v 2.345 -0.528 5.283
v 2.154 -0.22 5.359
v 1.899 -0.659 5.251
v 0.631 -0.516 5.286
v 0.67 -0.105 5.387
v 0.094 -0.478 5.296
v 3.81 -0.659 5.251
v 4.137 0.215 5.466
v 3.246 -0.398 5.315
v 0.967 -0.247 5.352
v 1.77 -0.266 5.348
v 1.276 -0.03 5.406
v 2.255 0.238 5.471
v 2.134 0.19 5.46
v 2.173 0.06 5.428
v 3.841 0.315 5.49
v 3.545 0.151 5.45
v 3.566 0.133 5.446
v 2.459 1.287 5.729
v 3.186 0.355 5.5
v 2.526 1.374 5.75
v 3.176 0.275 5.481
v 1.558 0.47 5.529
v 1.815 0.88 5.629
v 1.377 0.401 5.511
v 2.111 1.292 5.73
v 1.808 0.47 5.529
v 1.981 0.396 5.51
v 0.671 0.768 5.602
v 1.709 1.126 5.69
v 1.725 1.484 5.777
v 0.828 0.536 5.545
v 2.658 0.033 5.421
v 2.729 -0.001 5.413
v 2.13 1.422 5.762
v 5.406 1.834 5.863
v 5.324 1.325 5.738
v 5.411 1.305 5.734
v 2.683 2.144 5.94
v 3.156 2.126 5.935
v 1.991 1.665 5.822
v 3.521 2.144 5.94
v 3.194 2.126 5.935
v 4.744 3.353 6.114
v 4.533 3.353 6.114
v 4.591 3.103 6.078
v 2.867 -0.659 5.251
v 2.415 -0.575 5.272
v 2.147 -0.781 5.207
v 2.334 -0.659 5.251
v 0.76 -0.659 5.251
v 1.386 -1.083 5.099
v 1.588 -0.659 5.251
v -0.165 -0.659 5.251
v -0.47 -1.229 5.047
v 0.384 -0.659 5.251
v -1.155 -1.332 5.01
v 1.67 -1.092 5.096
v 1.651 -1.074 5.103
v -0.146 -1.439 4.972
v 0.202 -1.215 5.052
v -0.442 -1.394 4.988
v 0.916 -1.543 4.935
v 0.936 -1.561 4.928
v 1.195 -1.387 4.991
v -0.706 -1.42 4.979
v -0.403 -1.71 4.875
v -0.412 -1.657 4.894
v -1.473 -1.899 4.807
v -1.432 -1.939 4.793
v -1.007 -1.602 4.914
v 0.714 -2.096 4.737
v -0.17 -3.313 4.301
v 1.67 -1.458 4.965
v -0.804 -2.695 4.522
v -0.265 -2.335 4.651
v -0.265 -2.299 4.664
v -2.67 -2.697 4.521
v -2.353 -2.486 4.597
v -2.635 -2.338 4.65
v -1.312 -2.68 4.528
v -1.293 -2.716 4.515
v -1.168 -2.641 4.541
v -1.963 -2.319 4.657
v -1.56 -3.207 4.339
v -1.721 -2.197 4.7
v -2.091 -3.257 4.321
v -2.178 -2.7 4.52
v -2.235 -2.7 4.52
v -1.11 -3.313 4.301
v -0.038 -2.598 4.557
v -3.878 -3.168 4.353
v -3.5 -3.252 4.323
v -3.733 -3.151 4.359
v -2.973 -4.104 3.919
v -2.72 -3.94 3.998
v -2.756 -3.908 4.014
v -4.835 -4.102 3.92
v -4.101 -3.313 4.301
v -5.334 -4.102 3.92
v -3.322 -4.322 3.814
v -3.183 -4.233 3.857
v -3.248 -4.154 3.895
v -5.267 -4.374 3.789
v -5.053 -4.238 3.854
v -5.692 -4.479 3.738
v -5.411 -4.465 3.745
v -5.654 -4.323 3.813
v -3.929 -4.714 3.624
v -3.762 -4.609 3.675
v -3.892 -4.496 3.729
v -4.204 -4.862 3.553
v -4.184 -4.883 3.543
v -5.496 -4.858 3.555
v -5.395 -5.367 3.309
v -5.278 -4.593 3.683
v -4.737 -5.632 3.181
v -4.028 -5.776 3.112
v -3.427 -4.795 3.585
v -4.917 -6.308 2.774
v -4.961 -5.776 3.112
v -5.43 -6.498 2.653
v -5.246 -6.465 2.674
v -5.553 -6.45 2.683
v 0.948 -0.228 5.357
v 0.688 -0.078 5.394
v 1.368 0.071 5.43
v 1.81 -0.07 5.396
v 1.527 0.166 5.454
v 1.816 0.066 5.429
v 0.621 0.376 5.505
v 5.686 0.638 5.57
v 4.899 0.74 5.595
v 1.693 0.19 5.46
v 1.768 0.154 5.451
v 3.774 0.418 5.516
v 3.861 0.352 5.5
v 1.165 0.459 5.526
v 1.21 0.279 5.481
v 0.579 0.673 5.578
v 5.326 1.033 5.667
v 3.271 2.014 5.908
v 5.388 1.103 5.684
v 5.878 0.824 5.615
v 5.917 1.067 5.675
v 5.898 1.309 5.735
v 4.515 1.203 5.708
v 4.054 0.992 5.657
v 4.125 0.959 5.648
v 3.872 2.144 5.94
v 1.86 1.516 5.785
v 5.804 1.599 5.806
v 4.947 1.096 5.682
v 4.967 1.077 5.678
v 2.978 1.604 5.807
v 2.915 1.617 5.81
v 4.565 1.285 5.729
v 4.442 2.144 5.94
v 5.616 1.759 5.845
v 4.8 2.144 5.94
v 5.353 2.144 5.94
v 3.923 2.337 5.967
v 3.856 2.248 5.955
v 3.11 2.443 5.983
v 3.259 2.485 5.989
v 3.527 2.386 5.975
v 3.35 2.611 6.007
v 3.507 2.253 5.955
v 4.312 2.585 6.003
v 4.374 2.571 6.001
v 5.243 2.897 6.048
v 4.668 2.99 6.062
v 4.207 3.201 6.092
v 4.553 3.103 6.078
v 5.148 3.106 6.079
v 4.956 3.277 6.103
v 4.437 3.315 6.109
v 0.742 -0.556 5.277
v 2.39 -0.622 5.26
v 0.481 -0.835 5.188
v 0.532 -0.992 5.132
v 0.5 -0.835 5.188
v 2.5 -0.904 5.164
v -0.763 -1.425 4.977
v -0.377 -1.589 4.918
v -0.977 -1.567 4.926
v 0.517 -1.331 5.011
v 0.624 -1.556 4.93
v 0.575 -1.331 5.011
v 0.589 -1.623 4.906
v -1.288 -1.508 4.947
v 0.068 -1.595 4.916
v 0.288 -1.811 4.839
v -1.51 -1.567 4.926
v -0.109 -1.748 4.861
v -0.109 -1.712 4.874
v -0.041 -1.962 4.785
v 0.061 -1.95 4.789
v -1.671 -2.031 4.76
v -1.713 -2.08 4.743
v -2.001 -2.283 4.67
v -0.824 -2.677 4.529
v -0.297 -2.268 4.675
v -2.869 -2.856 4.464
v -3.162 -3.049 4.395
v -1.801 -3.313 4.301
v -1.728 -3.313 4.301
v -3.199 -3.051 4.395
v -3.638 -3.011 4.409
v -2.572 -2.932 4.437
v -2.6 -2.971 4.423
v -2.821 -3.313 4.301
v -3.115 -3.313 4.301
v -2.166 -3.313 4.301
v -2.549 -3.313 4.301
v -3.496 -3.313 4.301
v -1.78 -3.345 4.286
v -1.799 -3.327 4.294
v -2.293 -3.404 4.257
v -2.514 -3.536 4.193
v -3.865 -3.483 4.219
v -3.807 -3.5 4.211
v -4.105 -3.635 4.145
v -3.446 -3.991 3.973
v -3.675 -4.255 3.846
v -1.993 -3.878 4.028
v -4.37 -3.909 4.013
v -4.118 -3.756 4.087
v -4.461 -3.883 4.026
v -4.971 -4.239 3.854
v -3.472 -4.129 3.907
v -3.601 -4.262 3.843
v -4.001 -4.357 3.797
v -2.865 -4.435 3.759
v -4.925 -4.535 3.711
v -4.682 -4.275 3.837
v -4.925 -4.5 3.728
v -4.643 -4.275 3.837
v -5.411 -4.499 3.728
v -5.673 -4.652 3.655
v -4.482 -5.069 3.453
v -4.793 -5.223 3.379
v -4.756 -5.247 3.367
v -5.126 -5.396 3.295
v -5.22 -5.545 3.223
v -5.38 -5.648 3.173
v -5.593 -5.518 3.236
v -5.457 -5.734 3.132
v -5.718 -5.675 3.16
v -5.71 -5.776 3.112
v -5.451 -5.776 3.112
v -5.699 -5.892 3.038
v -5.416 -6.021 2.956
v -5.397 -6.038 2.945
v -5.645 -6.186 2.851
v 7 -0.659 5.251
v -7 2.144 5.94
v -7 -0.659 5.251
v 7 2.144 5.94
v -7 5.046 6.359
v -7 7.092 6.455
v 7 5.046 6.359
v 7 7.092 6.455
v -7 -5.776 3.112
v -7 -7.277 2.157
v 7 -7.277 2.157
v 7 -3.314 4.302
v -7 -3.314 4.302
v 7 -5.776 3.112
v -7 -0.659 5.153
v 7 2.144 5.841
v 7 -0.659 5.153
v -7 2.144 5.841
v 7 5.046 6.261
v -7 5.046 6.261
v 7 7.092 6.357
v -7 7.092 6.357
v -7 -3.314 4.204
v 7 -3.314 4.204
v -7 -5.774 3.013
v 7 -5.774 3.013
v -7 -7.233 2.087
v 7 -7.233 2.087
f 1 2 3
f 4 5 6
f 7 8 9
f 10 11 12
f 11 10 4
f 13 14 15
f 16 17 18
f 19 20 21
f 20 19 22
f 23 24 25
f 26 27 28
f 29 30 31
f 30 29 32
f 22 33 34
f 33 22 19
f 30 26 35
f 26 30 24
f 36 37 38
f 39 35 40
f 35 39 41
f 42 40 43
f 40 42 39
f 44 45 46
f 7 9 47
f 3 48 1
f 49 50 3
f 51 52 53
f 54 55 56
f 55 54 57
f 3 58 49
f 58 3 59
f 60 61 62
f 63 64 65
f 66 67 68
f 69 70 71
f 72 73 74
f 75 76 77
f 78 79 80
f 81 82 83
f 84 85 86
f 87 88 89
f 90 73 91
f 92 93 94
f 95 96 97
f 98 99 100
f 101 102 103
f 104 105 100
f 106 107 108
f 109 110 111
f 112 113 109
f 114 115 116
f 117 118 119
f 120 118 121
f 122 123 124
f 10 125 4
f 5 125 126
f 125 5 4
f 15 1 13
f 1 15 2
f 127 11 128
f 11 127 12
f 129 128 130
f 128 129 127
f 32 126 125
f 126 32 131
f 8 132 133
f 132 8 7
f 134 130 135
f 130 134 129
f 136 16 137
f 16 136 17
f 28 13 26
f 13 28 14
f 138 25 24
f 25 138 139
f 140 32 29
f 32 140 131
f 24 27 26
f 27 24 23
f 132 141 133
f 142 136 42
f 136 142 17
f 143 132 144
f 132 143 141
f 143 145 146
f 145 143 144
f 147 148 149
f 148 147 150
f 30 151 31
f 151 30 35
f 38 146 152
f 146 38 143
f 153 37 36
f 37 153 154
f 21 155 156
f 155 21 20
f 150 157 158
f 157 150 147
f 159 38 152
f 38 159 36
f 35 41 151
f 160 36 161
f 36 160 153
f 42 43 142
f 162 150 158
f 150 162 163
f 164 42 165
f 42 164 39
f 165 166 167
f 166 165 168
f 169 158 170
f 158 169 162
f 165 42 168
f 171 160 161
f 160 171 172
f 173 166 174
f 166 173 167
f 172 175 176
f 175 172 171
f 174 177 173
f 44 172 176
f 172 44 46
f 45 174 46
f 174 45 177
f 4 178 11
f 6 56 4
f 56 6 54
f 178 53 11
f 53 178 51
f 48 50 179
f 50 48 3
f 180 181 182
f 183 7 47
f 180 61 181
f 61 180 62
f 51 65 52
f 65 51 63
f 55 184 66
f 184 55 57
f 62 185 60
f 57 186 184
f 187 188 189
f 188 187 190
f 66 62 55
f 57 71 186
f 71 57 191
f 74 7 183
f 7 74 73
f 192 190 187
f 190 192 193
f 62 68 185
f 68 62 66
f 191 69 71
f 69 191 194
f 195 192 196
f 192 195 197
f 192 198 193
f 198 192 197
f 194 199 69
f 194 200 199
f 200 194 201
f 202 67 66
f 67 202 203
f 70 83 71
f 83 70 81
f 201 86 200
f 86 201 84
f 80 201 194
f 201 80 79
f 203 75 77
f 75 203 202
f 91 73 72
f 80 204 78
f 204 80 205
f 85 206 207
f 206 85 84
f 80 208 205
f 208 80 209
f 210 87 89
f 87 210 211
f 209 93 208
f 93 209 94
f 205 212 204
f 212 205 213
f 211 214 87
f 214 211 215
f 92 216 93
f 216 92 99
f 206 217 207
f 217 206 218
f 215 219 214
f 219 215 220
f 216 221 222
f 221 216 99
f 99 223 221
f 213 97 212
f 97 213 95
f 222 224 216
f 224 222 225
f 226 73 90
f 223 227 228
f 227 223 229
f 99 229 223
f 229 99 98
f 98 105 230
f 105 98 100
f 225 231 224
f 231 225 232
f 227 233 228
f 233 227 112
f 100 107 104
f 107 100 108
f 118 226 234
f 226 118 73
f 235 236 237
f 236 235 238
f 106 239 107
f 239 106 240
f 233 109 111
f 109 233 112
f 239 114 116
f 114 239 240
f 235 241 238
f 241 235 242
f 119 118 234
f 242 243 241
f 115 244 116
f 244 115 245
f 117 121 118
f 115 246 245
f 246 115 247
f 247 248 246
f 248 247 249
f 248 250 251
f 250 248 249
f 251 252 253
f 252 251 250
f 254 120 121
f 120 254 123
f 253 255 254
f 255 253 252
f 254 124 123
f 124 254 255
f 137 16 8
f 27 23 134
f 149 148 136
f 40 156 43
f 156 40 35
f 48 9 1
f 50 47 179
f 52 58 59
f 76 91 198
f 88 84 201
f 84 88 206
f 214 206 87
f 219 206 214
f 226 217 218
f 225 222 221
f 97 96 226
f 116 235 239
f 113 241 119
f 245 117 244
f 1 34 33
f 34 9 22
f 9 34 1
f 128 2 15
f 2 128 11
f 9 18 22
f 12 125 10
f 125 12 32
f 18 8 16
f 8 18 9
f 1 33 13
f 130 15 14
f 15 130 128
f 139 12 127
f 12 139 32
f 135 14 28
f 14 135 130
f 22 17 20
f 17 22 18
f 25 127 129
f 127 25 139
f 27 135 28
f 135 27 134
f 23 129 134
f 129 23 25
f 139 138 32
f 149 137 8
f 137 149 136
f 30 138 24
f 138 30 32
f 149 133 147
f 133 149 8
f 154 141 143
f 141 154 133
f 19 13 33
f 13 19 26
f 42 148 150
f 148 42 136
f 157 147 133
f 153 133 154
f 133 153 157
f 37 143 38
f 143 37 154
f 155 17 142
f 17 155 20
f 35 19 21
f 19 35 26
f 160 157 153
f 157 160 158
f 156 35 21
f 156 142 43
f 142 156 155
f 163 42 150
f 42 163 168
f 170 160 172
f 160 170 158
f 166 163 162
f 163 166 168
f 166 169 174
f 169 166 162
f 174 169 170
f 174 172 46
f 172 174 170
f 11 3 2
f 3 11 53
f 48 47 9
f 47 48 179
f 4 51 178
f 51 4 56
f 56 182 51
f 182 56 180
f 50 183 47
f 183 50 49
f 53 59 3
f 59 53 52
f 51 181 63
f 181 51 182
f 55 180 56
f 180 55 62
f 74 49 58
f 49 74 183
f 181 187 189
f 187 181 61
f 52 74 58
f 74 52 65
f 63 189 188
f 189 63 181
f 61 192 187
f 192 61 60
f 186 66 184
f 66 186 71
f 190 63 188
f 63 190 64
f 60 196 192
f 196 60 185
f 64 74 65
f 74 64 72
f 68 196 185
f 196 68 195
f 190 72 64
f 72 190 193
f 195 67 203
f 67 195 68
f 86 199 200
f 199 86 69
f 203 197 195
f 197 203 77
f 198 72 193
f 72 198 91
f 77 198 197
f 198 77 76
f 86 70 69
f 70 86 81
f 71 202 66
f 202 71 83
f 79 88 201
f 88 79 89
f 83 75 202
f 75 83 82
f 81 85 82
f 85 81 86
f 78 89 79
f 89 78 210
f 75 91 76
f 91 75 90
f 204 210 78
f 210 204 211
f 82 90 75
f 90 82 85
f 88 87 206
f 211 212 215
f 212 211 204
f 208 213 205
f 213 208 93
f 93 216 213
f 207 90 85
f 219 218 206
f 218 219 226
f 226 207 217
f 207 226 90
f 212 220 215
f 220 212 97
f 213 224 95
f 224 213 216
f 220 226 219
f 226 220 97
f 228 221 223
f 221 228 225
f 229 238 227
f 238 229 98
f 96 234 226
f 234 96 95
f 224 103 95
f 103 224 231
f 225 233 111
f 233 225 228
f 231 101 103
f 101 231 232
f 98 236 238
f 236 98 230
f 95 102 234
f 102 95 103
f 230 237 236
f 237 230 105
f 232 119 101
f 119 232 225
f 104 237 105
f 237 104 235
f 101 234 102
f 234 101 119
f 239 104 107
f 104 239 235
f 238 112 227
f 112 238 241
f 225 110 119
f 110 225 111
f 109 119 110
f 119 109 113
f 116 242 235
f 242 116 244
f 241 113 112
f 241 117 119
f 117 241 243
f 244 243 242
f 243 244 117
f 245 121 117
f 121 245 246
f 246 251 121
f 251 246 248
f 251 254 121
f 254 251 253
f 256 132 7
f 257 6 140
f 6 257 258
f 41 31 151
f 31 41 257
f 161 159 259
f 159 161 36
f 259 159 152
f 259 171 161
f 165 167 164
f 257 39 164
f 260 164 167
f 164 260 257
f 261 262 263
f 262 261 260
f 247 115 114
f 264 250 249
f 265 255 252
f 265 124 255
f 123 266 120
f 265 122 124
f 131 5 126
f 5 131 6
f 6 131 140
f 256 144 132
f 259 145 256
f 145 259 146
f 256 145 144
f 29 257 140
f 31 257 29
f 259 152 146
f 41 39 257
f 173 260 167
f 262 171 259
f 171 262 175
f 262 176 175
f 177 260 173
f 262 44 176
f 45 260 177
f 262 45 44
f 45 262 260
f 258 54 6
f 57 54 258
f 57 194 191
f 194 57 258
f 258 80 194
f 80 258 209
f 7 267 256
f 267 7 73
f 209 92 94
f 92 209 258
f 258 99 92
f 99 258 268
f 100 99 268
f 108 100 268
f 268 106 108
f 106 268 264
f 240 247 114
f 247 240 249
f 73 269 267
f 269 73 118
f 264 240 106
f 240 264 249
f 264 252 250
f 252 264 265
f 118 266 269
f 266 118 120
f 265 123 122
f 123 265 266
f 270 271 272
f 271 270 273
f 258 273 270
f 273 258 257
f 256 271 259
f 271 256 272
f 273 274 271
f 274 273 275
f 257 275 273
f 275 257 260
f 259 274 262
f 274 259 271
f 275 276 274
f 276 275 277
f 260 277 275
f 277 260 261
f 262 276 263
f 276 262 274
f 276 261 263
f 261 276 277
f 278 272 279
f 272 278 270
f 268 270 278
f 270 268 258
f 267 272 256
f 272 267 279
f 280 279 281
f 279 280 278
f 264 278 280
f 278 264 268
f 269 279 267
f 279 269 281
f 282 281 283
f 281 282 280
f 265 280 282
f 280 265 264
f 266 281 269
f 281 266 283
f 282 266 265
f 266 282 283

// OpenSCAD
use <../lib.scad>
use <s/6296256ec01s01.scad>
function ldraw_lib__6372023ec01() = [
// 0 Sticker  1.9 x  1.8 with "nuova 500" Emblem on Bright Light Blue (Formed)
// 0 Name: 6372023ec01.dat
// 0 Author: Magnus Forsberg [MagFors]
// 0 !LDRAW_ORG Part UPDATE 2024-05
// 0 !LICENSE Licensed under CC BY 4.0 : see CAreadme.txt
// 
// 0 BFC CERTIFY CCW
  [0,"BFC","CERTIFY"],
  [0,"BFC","CCW"],
// 
// 0 !KEYWORDS 500, Bricklink 77942stk01, Brickowl 1064764, Cinquecento, FIAT
// 0 !KEYWORDS Nuova, Rebrickable 83460, set 77942
// 
// 0 !HISTORY 2024-06-30 [OrionP] Official Update 2024-05
// 
// 
// 1 212 0 0 0 1 0 0 0 1 0 0 0 1 s\6296256ec01s01.dat
  [1,212,0,0,0,1,0,0,0,1,0,0,0,1, ldraw_lib__s__6296256ec01s01()],
// 0 // backside
// 4 16 -17.5 -12.8827 -1.648 -17.5 -14.6036 5.36 17.5 -14.6036 5.36 17.5 -12.8827 -1.648
  [4,16,-17.5,-12.8827,-1.648,-17.5,-14.6036,5.36,17.5,-14.6036,5.36,17.5,-12.8827,-1.648],
// 4 16 -17.5 -12.8827 -1.648 -17.5 -13.1279 -1.648 -17.5 -14.8489 5.36 -17.5 -14.6036 5.36
  [4,16,-17.5,-12.8827,-1.648,-17.5,-13.1279,-1.648,-17.5,-14.8489,5.36,-17.5,-14.6036,5.36],
// 4 16 17.5 -13.1279 -1.648 17.5 -12.8827 -1.648 17.5 -14.6036 5.36 17.5 -14.8489 5.36
  [4,16,17.5,-13.1279,-1.648,17.5,-12.8827,-1.648,17.5,-14.6036,5.36,17.5,-14.8489,5.36],
// 4 16 17.5 -14.6036 5.36 -17.5 -14.6036 5.36 -17.5 -15.6524 12.616 17.5 -15.6524 12.616
  [4,16,17.5,-14.6036,5.36,-17.5,-14.6036,5.36,-17.5,-15.6524,12.616,17.5,-15.6524,12.616],
// 4 16 -17.5 -14.6036 5.36 -17.5 -14.8489 5.36 -17.5 -15.8969 12.616 -17.5 -15.6524 12.616
  [4,16,-17.5,-14.6036,5.36,-17.5,-14.8489,5.36,-17.5,-15.8969,12.616,-17.5,-15.6524,12.616],
// 4 16 17.5 -14.8489 5.36 17.5 -14.6036 5.36 17.5 -15.6524 12.616 17.5 -15.8969 12.616
  [4,16,17.5,-14.8489,5.36,17.5,-14.6036,5.36,17.5,-15.6524,12.616,17.5,-15.8969,12.616],
// 4 16 -17.5 -15.6524 12.616 -17.5 -15.8932 17.7298 17.5 -15.8932 17.7298 17.5 -15.6524 12.616
  [4,16,-17.5,-15.6524,12.616,-17.5,-15.8932,17.7298,17.5,-15.8932,17.7298,17.5,-15.6524,12.616],
// 4 16 -17.5 -15.6524 12.616 -17.5 -15.8969 12.616 -17.5 -16.1379 17.7301 -17.5 -15.8932 17.7298
  [4,16,-17.5,-15.6524,12.616,-17.5,-15.8969,12.616,-17.5,-16.1379,17.7301,-17.5,-15.8932,17.7298],
// 4 16 17.5 -15.8969 12.616 17.5 -15.6524 12.616 17.5 -15.8932 17.7298 17.5 -16.1379 17.7301
  [4,16,17.5,-15.8969,12.616,17.5,-15.6524,12.616,17.5,-15.8932,17.7298,17.5,-16.1379,17.7301],
// 4 16 -17.5 -16.1379 17.7301 17.5 -16.1379 17.7301 17.5 -15.8932 17.7298 -17.5 -15.8932 17.7298
  [4,16,-17.5,-16.1379,17.7301,17.5,-16.1379,17.7301,17.5,-15.8932,17.7298,-17.5,-15.8932,17.7298],
// 4 16 17.5 -12.8827 -1.648 17.5 -10.5099 -8.284 -17.5 -10.5099 -8.284 -17.5 -12.8827 -1.648
  [4,16,17.5,-12.8827,-1.648,17.5,-10.5099,-8.284,-17.5,-10.5099,-8.284,-17.5,-12.8827,-1.648],
// 4 16 -17.5 -12.8827 -1.648 -17.5 -10.5099 -8.284 -17.5 -10.7549 -8.284 -17.5 -13.1279 -1.648
  [4,16,-17.5,-12.8827,-1.648,-17.5,-10.5099,-8.284,-17.5,-10.7549,-8.284,-17.5,-13.1279,-1.648],
// 4 16 17.5 -13.1279 -1.648 17.5 -10.7549 -8.284 17.5 -10.5099 -8.284 17.5 -12.8827 -1.648
  [4,16,17.5,-13.1279,-1.648,17.5,-10.7549,-8.284,17.5,-10.5099,-8.284,17.5,-12.8827,-1.648],
// 4 16 -17.5 -10.5099 -8.284 17.5 -10.5099 -8.284 17.5 -7.5316 -14.436 -17.5 -7.5316 -14.436
  [4,16,-17.5,-10.5099,-8.284,17.5,-10.5099,-8.284,17.5,-7.5316,-14.436,-17.5,-7.5316,-14.436],
// 4 16 -17.5 -10.7549 -8.284 -17.5 -10.5099 -8.284 -17.5 -7.5316 -14.436 -17.5 -7.7789 -14.44
  [4,16,-17.5,-10.7549,-8.284,-17.5,-10.5099,-8.284,-17.5,-7.5316,-14.436,-17.5,-7.7789,-14.44],
// 4 16 17.5 -10.5099 -8.284 17.5 -10.7549 -8.284 17.5 -7.7789 -14.44 17.5 -7.5316 -14.436
  [4,16,17.5,-10.5099,-8.284,17.5,-10.7549,-8.284,17.5,-7.7789,-14.44,17.5,-7.5316,-14.436],
// 4 16 -17.5 -7.5316 -14.436 17.5 -7.5316 -14.436 17.5 -5.2174 -18.0819 -17.5 -5.2174 -18.0819
  [4,16,-17.5,-7.5316,-14.436,17.5,-7.5316,-14.436,17.5,-5.2174,-18.0819,-17.5,-5.2174,-18.0819],
// 4 16 -17.5 -7.7789 -14.44 -17.5 -7.5316 -14.436 -17.5 -5.2174 -18.0819 -17.5 -5.3931 -18.1936
  [4,16,-17.5,-7.7789,-14.44,-17.5,-7.5316,-14.436,-17.5,-5.2174,-18.0819,-17.5,-5.3931,-18.1936],
// 4 16 17.5 -7.5316 -14.436 17.5 -7.7789 -14.44 17.5 -5.3931 -18.1936 17.5 -5.2174 -18.0819
  [4,16,17.5,-7.5316,-14.436,17.5,-7.7789,-14.44,17.5,-5.3931,-18.1936,17.5,-5.2174,-18.0819],
// 4 16 -17.5 -5.3931 -18.1936 -17.5 -5.2174 -18.0819 17.5 -5.2174 -18.0819 17.5 -5.3931 -18.1936
  [4,16,-17.5,-5.3931,-18.1936,-17.5,-5.2174,-18.0819,17.5,-5.2174,-18.0819,17.5,-5.3931,-18.1936],
// 5 24 17.5 -15.8969 12.616 -17.5 -15.8969 12.616 17.5 -16.1379 17.7301 17.5 -14.8489 5.36
  [5,24,17.5,-15.8969,12.616,-17.5,-15.8969,12.616,17.5,-16.1379,17.7301,17.5,-14.8489,5.36],
// 5 24 17.5 -14.8489 5.36 -17.5 -14.8489 5.36 17.5 -15.8969 12.616 17.5 -13.1279 -1.648
  [5,24,17.5,-14.8489,5.36,-17.5,-14.8489,5.36,17.5,-15.8969,12.616,17.5,-13.1279,-1.648],
// 5 24 17.5 -13.1279 -1.648 -17.5 -13.1279 -1.648 17.5 -14.8489 5.36 17.5 -10.7549 -8.284
  [5,24,17.5,-13.1279,-1.648,-17.5,-13.1279,-1.648,17.5,-14.8489,5.36,17.5,-10.7549,-8.284],
// 5 24 17.5 -10.7549 -8.284 -17.5 -10.7549 -8.284 17.5 -13.1279 -1.648 17.5 -7.7789 -14.44
  [5,24,17.5,-10.7549,-8.284,-17.5,-10.7549,-8.284,17.5,-13.1279,-1.648,17.5,-7.7789,-14.44],
// 5 24 17.5 -7.7789 -14.44 -17.5 -7.7789 -14.44 17.5 -10.7549 -8.284 17.5 -5.3931 -18.1936
  [5,24,17.5,-7.7789,-14.44,-17.5,-7.7789,-14.44,17.5,-10.7549,-8.284,17.5,-5.3931,-18.1936],
// 5 24 17.5 -15.6524 12.616 -17.5 -15.6524 12.616 17.5 -15.8932 17.7298 17.5 -14.6036 5.36
  [5,24,17.5,-15.6524,12.616,-17.5,-15.6524,12.616,17.5,-15.8932,17.7298,17.5,-14.6036,5.36],
// 5 24 17.5 -14.6036 5.36 -17.5 -14.6036 5.36 17.5 -15.6524 12.616 17.5 -12.8827 -1.648
  [5,24,17.5,-14.6036,5.36,-17.5,-14.6036,5.36,17.5,-15.6524,12.616,17.5,-12.8827,-1.648],
// 5 24 17.5 -12.8827 -1.648 -17.5 -12.8827 -1.648 17.5 -14.6036 5.36 17.5 -10.5099 -8.284
  [5,24,17.5,-12.8827,-1.648,-17.5,-12.8827,-1.648,17.5,-14.6036,5.36,17.5,-10.5099,-8.284],
// 5 24 17.5 -10.5099 -8.284 -17.5 -10.5099 -8.284 17.5 -12.8827 -1.648 17.5 -7.5316 -14.436
  [5,24,17.5,-10.5099,-8.284,-17.5,-10.5099,-8.284,17.5,-12.8827,-1.648,17.5,-7.5316,-14.436],
// 5 24 17.5 -7.5316 -14.436 -17.5 -7.5316 -14.436 17.5 -10.5099 -8.284 17.5 -5.2174 -18.0819
  [5,24,17.5,-7.5316,-14.436,-17.5,-7.5316,-14.436,17.5,-10.5099,-8.284,17.5,-5.2174,-18.0819],
];
module ldraw_lib__6372023ec01(step=0, col=false, unit=2/5, alt=false, line=0.2, solid=!$preview)
    makepoly(ldraw_lib__6372023ec01(), step=step, col=col, unit=unit, alt=alt, line=line, solid=solid);
ldraw_lib__6372023ec01(line=0.2);
